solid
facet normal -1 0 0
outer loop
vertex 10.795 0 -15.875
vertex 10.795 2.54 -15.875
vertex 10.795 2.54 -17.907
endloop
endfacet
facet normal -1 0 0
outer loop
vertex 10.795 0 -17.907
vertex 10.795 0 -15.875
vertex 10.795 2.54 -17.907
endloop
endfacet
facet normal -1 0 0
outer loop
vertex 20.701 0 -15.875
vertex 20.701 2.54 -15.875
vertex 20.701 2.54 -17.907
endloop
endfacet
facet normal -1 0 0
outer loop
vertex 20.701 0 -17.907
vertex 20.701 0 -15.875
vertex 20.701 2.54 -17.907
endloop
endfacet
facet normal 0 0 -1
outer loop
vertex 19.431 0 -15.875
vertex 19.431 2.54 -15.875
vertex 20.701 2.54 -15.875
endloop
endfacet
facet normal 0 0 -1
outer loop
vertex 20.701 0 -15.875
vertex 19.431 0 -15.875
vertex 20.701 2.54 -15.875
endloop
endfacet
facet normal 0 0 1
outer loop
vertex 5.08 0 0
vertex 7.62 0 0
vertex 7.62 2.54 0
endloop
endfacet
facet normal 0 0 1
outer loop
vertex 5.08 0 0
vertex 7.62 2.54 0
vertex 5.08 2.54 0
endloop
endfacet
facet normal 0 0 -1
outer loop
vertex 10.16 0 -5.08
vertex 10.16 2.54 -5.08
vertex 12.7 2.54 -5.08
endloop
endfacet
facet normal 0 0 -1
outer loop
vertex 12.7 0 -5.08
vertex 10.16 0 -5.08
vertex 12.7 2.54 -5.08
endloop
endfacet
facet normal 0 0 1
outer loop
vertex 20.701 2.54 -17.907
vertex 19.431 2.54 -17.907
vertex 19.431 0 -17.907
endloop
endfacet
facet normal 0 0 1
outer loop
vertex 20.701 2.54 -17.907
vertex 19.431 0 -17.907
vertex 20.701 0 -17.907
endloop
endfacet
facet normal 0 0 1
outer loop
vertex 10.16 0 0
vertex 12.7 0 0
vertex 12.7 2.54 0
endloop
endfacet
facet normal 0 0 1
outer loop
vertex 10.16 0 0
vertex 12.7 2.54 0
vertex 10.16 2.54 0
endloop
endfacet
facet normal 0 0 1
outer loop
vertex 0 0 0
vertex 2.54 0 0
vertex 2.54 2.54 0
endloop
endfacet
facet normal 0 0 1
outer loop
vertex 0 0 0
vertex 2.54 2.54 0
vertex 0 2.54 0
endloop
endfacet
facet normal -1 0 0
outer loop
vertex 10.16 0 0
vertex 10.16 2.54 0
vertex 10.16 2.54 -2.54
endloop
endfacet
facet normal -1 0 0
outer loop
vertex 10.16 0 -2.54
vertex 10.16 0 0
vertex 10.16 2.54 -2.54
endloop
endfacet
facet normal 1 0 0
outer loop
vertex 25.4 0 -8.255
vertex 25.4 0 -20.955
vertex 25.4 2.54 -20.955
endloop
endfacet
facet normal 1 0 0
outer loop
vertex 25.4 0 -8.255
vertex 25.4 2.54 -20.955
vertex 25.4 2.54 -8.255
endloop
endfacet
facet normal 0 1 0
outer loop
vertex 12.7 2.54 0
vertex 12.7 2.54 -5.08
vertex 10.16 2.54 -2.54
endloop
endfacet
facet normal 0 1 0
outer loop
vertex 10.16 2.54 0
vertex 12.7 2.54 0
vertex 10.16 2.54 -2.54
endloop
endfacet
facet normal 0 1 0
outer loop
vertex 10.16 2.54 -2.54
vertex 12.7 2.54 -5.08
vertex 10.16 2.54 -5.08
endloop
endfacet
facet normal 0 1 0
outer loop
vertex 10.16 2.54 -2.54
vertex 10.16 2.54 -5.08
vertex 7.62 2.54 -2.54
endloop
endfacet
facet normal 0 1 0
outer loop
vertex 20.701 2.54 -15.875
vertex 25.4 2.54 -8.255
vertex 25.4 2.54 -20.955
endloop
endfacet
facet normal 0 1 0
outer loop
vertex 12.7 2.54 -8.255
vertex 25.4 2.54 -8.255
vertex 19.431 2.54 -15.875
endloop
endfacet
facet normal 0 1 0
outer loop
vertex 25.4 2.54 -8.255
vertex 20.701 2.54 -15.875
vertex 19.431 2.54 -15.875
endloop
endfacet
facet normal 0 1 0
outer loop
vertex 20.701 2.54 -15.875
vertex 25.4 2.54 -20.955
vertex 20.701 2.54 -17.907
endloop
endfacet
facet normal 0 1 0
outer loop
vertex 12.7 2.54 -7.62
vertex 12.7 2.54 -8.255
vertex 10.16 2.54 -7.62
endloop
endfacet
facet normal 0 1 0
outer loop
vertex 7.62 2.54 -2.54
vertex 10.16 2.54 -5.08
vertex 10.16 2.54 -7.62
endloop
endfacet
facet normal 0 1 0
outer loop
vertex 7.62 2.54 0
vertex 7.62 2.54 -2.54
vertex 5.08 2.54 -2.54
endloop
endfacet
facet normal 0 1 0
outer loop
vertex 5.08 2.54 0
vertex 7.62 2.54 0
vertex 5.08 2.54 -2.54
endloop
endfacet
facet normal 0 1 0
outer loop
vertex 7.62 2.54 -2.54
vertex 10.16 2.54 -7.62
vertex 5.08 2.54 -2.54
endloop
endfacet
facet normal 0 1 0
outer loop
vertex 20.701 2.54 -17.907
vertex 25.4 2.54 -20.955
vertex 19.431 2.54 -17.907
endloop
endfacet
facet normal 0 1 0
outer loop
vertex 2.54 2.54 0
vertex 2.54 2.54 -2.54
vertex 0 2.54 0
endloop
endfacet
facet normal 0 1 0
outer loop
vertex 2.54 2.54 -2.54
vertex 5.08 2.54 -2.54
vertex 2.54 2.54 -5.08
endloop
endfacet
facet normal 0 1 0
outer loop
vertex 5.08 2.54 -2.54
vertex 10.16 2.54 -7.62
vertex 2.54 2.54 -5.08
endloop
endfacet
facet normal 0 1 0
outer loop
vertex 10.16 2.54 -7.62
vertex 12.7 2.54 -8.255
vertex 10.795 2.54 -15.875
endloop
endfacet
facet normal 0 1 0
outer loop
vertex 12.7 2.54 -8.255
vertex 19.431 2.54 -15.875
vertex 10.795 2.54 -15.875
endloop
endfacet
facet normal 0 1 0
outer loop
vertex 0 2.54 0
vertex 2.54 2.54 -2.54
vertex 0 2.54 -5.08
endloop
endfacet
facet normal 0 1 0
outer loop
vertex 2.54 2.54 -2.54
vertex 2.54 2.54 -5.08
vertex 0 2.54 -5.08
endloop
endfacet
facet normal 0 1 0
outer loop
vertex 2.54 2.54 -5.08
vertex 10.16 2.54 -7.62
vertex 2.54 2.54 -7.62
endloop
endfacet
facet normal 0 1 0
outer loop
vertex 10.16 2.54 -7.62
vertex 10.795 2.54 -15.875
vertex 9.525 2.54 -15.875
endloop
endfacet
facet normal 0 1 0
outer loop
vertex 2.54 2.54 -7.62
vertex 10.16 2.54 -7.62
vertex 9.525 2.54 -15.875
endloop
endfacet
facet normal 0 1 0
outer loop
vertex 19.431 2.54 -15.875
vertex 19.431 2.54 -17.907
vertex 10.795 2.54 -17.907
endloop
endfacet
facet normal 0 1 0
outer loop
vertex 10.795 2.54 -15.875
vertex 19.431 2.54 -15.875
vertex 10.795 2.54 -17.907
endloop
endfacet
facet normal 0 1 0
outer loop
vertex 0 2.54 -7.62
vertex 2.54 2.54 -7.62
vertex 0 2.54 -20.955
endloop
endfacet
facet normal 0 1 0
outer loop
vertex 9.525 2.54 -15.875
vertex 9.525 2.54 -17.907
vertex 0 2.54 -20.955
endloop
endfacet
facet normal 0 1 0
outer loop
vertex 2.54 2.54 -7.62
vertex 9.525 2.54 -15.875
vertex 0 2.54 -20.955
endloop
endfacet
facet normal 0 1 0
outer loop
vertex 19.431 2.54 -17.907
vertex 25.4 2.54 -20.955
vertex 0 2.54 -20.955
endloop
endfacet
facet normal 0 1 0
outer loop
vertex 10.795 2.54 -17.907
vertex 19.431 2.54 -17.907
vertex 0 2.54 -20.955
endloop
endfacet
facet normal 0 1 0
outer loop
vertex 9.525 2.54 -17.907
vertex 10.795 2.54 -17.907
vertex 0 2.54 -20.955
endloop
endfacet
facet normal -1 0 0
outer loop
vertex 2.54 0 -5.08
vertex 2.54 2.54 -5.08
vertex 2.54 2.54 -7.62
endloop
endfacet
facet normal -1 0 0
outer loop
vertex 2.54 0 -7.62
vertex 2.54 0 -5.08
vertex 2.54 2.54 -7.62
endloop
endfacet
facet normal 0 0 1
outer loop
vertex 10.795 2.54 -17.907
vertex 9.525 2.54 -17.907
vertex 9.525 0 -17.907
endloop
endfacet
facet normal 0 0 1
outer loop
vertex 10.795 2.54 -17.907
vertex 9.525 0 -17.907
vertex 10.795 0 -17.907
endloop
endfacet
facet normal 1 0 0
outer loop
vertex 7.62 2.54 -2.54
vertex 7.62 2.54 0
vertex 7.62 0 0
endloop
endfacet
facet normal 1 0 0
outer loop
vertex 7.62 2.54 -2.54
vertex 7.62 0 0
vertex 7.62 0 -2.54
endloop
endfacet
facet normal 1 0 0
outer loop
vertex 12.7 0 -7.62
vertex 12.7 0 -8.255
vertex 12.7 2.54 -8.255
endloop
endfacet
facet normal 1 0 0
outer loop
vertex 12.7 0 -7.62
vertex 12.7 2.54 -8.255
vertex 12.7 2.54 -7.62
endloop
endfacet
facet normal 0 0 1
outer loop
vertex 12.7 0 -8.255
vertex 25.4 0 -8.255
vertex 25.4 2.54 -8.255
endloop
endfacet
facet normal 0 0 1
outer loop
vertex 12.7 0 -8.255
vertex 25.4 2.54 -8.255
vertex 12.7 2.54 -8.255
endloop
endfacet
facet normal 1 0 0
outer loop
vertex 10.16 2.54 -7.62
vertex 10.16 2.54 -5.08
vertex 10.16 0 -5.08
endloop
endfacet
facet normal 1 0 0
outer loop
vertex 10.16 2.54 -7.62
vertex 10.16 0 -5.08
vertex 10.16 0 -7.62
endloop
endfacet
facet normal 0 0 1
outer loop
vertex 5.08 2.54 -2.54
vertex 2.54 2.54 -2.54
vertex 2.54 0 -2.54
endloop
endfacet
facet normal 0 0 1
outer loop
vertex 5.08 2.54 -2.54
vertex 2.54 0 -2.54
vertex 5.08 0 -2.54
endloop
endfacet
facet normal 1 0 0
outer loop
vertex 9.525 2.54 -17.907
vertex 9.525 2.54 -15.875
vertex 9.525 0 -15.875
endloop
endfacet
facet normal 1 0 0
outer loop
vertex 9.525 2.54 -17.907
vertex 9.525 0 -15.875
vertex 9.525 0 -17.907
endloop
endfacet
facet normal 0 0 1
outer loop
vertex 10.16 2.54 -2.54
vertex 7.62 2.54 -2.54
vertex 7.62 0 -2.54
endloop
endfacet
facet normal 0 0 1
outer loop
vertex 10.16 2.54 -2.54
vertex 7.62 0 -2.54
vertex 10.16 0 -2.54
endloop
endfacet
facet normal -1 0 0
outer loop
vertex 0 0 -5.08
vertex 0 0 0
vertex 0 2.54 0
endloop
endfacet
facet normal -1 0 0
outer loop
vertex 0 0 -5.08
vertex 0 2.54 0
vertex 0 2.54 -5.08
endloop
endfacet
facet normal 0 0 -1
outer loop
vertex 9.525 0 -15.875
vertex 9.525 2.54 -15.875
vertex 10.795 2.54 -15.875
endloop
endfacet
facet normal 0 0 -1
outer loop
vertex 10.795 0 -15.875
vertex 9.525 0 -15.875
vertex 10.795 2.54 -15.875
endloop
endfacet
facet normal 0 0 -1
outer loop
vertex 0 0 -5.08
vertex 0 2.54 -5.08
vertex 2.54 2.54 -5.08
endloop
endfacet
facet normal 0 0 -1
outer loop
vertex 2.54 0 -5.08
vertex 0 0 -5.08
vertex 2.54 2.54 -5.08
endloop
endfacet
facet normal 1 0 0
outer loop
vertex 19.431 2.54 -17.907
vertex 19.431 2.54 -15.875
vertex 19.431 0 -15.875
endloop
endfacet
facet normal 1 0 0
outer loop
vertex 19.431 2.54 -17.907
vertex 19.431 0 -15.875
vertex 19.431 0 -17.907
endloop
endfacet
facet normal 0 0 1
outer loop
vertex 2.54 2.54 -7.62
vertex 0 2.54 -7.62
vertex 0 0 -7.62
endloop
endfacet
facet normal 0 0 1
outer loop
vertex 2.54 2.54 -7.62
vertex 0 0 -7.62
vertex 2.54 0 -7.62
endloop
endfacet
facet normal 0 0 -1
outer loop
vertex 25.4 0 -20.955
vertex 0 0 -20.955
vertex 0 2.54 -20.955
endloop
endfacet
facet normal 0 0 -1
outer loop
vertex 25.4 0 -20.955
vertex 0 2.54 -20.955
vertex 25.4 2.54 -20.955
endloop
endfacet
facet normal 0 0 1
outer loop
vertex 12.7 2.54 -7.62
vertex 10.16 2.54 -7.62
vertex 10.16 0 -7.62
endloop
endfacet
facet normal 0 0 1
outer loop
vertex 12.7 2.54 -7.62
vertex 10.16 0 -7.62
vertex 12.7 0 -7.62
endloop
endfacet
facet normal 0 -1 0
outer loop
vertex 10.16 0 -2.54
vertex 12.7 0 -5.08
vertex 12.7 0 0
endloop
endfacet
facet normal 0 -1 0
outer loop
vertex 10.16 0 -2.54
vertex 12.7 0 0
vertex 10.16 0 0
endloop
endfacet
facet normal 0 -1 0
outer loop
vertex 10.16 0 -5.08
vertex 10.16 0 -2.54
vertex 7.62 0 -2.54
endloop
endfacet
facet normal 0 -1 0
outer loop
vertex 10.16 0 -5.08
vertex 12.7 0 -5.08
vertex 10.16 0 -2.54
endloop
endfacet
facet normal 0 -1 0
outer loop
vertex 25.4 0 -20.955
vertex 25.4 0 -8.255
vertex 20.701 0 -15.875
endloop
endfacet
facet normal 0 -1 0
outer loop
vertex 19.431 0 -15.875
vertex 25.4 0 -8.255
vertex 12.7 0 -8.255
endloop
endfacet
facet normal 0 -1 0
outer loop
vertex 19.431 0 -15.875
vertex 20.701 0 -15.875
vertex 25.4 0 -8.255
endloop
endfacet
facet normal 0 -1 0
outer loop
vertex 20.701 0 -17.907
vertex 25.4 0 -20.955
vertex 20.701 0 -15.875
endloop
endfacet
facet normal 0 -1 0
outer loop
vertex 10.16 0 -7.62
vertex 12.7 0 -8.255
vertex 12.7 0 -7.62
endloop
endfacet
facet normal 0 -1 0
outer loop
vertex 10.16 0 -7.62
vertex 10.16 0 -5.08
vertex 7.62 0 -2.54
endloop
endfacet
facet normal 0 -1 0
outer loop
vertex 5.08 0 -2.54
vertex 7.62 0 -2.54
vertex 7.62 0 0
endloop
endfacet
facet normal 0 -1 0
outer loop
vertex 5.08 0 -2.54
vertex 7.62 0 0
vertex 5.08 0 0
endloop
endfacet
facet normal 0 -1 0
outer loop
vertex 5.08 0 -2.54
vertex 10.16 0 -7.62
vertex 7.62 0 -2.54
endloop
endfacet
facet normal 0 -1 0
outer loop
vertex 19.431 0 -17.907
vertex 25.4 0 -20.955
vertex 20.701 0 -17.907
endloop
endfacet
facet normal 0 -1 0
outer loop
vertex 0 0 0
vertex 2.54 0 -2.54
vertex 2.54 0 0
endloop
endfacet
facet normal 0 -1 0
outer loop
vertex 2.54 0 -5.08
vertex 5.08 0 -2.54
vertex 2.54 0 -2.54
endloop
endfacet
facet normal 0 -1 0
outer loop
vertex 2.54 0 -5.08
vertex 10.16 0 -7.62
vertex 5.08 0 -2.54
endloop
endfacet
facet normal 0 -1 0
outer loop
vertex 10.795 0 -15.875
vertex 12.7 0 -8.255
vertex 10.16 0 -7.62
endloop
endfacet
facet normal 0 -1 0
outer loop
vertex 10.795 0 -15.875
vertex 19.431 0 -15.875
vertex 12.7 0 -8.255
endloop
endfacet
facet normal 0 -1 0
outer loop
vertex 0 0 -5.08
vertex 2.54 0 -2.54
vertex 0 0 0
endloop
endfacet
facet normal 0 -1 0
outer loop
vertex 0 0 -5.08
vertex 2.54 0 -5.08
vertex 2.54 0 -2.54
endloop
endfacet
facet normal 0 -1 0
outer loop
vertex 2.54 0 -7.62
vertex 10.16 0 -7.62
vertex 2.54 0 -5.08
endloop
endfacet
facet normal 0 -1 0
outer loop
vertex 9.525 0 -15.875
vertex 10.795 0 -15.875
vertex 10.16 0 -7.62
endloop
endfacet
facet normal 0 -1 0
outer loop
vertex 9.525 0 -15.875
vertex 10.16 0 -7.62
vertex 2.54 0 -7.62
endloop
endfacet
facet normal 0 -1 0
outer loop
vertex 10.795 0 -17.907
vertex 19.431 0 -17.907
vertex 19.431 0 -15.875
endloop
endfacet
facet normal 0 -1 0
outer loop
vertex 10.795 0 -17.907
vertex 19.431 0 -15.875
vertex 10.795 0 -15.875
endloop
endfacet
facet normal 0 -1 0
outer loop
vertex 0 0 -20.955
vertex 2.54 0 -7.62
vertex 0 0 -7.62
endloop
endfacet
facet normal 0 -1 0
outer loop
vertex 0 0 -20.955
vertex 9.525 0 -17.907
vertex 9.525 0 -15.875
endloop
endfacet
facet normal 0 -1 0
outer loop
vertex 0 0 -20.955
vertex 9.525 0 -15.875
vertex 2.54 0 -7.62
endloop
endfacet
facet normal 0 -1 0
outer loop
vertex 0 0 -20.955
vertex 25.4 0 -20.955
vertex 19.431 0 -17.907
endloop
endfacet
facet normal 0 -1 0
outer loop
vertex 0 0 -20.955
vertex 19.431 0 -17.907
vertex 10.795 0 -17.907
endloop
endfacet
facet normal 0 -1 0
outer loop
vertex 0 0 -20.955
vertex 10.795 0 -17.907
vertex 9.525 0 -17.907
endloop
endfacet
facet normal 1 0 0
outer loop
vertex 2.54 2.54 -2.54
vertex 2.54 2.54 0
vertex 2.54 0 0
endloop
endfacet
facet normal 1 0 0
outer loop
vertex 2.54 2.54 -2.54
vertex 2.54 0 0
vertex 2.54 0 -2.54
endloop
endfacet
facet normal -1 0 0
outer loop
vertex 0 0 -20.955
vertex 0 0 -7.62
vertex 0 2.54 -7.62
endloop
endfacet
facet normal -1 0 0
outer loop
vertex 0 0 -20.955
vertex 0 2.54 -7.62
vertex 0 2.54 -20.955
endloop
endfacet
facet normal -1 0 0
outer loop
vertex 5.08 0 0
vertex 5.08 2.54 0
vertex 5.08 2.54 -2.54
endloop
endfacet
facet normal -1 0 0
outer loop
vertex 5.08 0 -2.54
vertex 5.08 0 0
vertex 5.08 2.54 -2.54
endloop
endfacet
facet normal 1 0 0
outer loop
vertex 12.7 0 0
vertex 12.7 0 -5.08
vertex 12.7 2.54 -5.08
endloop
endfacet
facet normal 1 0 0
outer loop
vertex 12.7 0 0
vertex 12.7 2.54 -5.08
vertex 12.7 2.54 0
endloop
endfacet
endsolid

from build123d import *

# Parameters (mm, degrees)
BOSS_EXTRUDE1_DEPTH = 2.54
SKETCH2_W           = 2.54
SKETCH2_H           = 2.54
CUT_EXTRUDE1_DEPTH  = 34.026105205
SKETCH3_W           = 1.27
SKETCH3_H           = 2.032
CUT_EXTRUDE2_DEPTH  = 34.026105205
SKETCH4_W           = 2.54
SKETCH4_H           = 2.54
CUT_EXTRUDE3_DEPTH  = 34.026105205


with BuildPart() as part:
    # Sketch1 → Boss-Extrude1 (new body)
    with BuildSketch(Plane(origin=(0, 0, 0), x_dir=(1, 0, 0), z_dir=(0, 1, 0))):
        Polygon((0, 0), (0, 20.955), (25.4, 20.955), (25.4, 8.255), (12.7, 8.255), (12.7, 0), align=None)
    extrude(amount=BOSS_EXTRUDE1_DEPTH)

    # Sketch2 → Cut-Extrude1 (cut, through all)
    with BuildSketch(Plane(origin=(0, 2.54, 0), x_dir=(1, 0, 0), z_dir=(0, 1, 0))):
        with Locations((3.81, 1.27)):
            Rectangle(SKETCH2_W, SKETCH2_H)
        with Locations((8.89, 1.27)):
            Rectangle(SKETCH2_W, SKETCH2_H)
    extrude(amount=-CUT_EXTRUDE1_DEPTH, mode=Mode.SUBTRACT)

    # Sketch3 → Cut-Extrude2 (cut, through all)
    with BuildSketch(Plane(origin=(0, 2.54, 0), x_dir=(1, 0, 0), z_dir=(0, 1, 0))):
        with Locations((10.16, 16.891)):
            Rectangle(SKETCH3_W, SKETCH3_H)
        with Locations((20.066, 16.891)):
            Rectangle(SKETCH3_W, SKETCH3_H)
    extrude(amount=-CUT_EXTRUDE2_DEPTH, mode=Mode.SUBTRACT)

    # Sketch4 → Cut-Extrude3 (cut, through all)
    with BuildSketch(Plane(origin=(0, 2.54, 0), x_dir=(1, 0, 0), z_dir=(0, 1, 0))):
        with Locations((1.27, 6.35)):
            Rectangle(SKETCH4_W, SKETCH4_H)
        with Locations((11.43, 6.35)):
            Rectangle(SKETCH4_W, SKETCH4_H)
    extrude(amount=-CUT_EXTRUDE3_DEPTH, mode=Mode.SUBTRACT)


solid = part.part
